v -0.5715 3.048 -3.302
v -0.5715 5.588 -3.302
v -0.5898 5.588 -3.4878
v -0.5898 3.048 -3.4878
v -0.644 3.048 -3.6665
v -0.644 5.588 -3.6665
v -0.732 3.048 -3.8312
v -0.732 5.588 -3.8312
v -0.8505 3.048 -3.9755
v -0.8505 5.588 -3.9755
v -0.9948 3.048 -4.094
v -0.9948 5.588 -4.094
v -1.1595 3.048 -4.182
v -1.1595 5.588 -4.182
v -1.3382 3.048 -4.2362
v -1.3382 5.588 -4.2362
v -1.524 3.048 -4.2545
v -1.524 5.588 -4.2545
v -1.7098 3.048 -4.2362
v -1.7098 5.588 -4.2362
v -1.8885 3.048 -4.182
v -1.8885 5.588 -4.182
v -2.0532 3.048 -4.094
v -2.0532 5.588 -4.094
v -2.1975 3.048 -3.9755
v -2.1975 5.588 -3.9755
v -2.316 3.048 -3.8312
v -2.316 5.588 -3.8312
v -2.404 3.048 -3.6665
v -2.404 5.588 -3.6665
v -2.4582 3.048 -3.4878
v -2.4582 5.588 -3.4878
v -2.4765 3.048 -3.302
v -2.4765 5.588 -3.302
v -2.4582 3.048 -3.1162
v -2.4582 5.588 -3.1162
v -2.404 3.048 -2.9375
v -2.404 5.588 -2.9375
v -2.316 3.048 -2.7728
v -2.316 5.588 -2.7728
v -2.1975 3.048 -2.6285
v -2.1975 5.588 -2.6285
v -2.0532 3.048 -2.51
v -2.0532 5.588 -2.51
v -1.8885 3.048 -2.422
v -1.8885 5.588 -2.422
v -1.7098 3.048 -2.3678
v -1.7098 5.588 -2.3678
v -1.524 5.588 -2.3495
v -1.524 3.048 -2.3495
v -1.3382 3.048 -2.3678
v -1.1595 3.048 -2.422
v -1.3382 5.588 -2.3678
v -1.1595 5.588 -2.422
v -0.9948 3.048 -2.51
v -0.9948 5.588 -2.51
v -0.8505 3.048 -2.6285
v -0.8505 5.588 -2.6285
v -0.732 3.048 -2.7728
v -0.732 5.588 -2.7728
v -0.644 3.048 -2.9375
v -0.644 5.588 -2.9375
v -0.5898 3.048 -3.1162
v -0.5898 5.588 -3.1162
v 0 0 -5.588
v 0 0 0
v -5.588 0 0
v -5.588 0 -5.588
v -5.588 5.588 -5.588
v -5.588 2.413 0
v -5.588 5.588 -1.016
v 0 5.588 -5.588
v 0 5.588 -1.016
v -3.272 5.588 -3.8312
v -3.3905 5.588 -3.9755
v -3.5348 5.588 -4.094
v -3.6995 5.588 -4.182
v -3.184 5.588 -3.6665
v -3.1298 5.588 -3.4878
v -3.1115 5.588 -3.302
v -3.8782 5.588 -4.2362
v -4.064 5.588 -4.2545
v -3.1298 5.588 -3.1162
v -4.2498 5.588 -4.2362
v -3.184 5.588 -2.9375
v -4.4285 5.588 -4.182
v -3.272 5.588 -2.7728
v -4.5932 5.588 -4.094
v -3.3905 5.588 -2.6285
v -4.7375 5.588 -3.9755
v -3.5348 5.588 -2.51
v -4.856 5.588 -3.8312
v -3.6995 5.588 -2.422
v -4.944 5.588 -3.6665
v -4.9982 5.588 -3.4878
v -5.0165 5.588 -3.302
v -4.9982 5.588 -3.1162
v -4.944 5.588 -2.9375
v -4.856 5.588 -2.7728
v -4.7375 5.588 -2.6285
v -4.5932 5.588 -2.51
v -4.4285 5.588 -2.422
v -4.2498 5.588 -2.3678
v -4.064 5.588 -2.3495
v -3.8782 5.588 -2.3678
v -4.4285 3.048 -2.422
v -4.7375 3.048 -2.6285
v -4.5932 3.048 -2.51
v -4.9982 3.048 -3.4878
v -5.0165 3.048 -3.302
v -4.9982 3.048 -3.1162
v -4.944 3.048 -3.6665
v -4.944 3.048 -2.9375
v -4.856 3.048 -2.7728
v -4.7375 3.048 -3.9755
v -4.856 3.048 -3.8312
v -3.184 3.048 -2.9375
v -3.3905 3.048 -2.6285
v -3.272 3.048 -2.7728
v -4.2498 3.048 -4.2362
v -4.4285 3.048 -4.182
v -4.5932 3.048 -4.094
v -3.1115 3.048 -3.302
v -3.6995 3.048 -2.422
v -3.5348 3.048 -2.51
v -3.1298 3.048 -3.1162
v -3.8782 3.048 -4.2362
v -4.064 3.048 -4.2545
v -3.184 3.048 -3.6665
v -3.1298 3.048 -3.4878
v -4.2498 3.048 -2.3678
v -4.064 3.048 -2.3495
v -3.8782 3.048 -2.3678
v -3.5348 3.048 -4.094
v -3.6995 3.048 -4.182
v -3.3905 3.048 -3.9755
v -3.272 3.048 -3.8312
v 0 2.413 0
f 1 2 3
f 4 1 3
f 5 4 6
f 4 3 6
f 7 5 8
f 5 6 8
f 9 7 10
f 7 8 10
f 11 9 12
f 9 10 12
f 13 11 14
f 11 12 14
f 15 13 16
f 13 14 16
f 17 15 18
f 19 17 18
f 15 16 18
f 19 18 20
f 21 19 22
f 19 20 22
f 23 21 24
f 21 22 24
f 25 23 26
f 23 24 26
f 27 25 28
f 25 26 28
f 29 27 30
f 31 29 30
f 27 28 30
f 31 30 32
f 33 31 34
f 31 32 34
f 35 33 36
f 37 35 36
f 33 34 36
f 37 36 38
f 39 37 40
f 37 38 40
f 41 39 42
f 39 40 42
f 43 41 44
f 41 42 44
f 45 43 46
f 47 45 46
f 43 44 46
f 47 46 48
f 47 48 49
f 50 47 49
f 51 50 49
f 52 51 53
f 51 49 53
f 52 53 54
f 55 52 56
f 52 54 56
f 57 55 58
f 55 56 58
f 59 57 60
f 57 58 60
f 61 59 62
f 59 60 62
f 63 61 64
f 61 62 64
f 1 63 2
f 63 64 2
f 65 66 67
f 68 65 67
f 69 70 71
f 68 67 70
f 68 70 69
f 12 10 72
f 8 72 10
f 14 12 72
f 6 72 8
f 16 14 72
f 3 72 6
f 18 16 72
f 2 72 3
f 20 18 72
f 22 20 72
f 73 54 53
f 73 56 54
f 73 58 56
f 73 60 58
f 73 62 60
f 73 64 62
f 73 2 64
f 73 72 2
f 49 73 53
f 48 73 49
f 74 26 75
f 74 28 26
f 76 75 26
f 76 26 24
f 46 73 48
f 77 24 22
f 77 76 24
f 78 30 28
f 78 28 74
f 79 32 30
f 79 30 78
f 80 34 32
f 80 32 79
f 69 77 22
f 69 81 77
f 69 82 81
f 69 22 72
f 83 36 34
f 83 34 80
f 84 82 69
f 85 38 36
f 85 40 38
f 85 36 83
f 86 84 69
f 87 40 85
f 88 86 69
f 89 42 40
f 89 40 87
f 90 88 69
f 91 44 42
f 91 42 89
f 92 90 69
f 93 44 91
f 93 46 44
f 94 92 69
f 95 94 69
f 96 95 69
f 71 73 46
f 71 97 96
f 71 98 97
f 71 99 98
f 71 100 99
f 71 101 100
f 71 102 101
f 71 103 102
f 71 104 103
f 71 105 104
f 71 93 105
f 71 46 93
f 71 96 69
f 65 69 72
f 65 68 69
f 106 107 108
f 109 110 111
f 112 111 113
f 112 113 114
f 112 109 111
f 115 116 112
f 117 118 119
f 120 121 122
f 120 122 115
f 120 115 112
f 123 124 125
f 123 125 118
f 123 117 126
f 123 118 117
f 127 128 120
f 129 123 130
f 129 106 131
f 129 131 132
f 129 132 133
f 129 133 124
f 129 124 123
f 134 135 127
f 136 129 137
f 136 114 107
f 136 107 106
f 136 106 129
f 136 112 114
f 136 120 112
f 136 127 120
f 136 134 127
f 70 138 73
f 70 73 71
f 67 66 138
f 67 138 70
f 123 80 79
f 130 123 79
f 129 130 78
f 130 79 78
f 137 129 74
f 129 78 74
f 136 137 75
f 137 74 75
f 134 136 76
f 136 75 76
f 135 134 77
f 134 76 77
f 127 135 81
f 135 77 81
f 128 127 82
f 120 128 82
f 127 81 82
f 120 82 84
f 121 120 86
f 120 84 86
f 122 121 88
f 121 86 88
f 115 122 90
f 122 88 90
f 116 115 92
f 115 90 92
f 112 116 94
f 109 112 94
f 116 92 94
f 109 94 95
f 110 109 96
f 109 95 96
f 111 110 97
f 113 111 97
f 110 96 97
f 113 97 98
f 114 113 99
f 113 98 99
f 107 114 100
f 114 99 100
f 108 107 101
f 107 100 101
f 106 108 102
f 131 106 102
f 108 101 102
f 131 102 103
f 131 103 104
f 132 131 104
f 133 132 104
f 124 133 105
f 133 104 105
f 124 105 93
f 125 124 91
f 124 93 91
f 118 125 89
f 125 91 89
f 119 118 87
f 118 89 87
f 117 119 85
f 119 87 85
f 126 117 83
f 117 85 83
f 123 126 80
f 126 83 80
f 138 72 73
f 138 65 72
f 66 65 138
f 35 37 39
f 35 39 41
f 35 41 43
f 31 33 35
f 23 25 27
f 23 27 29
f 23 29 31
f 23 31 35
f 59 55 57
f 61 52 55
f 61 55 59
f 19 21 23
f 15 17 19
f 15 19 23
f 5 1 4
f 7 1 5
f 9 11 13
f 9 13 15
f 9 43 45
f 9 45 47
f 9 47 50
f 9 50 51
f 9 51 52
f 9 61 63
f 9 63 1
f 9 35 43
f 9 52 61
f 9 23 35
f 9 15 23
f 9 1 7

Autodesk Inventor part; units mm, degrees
ref_plane "YZ Plane" through (0, 0, 0) normal (1, 0, 0) x (0, 1, 0)
ref_plane "XZ Plane" through (0, 0, 0) normal (0, 1, 0) x (-1, 0, 0)
ref_plane "XY Plane" through (0, 0, 0) normal (0, 0, 1) x (1, 0, 0)
sketch "Sketch1" plane through (0, 0, 0) normal (0, 1, 0) x (-1, 0, 0)
  line L0 (0, 0) -> (5.588, 0)
  line L1 (5.588, 0) -> (5.588, -5.588)
  line L2 (5.588, -5.588) -> (0, -5.588)
  line L3 (0, -5.588) -> (0, 0)
  dimension "d0" = 5.588
  dimension "d1" = 5.588
extrude "Extrusion1" add sketch "Sketch1" along normal blind 5.588
chamfer "Chamfer1" distance 1.016 distance2 3.175 1 edges at (-2.794, 5.588, 0) measured on face at (-1.8627, 5.588, -1.8627)
sketch "Sketch2" plane through (0, 5.588, 0) normal (0, 1, 0) x (1, 0, 0)
  line L0 (0, 1.016) -> (-5.588, 1.016) projected
  line L1 (0, 1.016) -> (0, 5.588) projected
  line L2 (0, 5.588) -> (-5.588, 5.588) projected
  line L3 (-5.588, 5.588) -> (-5.588, 1.016) projected
  circle A0 centre (-4.064, 3.302) radius 0.9525
  circle A1 centre (-1.524, 3.302) radius 0.9525
  point P0 (0, 0)
  dimension "d7" = 1.905
  dimension "d8" = 1.905
  dimension "d9" = 1.524
  dimension "d10" = 1.524
extrude "Extrusion2" cut sketch "Sketch2" against normal blind 2.54 contours A0 | A1
properties part number "connector"
